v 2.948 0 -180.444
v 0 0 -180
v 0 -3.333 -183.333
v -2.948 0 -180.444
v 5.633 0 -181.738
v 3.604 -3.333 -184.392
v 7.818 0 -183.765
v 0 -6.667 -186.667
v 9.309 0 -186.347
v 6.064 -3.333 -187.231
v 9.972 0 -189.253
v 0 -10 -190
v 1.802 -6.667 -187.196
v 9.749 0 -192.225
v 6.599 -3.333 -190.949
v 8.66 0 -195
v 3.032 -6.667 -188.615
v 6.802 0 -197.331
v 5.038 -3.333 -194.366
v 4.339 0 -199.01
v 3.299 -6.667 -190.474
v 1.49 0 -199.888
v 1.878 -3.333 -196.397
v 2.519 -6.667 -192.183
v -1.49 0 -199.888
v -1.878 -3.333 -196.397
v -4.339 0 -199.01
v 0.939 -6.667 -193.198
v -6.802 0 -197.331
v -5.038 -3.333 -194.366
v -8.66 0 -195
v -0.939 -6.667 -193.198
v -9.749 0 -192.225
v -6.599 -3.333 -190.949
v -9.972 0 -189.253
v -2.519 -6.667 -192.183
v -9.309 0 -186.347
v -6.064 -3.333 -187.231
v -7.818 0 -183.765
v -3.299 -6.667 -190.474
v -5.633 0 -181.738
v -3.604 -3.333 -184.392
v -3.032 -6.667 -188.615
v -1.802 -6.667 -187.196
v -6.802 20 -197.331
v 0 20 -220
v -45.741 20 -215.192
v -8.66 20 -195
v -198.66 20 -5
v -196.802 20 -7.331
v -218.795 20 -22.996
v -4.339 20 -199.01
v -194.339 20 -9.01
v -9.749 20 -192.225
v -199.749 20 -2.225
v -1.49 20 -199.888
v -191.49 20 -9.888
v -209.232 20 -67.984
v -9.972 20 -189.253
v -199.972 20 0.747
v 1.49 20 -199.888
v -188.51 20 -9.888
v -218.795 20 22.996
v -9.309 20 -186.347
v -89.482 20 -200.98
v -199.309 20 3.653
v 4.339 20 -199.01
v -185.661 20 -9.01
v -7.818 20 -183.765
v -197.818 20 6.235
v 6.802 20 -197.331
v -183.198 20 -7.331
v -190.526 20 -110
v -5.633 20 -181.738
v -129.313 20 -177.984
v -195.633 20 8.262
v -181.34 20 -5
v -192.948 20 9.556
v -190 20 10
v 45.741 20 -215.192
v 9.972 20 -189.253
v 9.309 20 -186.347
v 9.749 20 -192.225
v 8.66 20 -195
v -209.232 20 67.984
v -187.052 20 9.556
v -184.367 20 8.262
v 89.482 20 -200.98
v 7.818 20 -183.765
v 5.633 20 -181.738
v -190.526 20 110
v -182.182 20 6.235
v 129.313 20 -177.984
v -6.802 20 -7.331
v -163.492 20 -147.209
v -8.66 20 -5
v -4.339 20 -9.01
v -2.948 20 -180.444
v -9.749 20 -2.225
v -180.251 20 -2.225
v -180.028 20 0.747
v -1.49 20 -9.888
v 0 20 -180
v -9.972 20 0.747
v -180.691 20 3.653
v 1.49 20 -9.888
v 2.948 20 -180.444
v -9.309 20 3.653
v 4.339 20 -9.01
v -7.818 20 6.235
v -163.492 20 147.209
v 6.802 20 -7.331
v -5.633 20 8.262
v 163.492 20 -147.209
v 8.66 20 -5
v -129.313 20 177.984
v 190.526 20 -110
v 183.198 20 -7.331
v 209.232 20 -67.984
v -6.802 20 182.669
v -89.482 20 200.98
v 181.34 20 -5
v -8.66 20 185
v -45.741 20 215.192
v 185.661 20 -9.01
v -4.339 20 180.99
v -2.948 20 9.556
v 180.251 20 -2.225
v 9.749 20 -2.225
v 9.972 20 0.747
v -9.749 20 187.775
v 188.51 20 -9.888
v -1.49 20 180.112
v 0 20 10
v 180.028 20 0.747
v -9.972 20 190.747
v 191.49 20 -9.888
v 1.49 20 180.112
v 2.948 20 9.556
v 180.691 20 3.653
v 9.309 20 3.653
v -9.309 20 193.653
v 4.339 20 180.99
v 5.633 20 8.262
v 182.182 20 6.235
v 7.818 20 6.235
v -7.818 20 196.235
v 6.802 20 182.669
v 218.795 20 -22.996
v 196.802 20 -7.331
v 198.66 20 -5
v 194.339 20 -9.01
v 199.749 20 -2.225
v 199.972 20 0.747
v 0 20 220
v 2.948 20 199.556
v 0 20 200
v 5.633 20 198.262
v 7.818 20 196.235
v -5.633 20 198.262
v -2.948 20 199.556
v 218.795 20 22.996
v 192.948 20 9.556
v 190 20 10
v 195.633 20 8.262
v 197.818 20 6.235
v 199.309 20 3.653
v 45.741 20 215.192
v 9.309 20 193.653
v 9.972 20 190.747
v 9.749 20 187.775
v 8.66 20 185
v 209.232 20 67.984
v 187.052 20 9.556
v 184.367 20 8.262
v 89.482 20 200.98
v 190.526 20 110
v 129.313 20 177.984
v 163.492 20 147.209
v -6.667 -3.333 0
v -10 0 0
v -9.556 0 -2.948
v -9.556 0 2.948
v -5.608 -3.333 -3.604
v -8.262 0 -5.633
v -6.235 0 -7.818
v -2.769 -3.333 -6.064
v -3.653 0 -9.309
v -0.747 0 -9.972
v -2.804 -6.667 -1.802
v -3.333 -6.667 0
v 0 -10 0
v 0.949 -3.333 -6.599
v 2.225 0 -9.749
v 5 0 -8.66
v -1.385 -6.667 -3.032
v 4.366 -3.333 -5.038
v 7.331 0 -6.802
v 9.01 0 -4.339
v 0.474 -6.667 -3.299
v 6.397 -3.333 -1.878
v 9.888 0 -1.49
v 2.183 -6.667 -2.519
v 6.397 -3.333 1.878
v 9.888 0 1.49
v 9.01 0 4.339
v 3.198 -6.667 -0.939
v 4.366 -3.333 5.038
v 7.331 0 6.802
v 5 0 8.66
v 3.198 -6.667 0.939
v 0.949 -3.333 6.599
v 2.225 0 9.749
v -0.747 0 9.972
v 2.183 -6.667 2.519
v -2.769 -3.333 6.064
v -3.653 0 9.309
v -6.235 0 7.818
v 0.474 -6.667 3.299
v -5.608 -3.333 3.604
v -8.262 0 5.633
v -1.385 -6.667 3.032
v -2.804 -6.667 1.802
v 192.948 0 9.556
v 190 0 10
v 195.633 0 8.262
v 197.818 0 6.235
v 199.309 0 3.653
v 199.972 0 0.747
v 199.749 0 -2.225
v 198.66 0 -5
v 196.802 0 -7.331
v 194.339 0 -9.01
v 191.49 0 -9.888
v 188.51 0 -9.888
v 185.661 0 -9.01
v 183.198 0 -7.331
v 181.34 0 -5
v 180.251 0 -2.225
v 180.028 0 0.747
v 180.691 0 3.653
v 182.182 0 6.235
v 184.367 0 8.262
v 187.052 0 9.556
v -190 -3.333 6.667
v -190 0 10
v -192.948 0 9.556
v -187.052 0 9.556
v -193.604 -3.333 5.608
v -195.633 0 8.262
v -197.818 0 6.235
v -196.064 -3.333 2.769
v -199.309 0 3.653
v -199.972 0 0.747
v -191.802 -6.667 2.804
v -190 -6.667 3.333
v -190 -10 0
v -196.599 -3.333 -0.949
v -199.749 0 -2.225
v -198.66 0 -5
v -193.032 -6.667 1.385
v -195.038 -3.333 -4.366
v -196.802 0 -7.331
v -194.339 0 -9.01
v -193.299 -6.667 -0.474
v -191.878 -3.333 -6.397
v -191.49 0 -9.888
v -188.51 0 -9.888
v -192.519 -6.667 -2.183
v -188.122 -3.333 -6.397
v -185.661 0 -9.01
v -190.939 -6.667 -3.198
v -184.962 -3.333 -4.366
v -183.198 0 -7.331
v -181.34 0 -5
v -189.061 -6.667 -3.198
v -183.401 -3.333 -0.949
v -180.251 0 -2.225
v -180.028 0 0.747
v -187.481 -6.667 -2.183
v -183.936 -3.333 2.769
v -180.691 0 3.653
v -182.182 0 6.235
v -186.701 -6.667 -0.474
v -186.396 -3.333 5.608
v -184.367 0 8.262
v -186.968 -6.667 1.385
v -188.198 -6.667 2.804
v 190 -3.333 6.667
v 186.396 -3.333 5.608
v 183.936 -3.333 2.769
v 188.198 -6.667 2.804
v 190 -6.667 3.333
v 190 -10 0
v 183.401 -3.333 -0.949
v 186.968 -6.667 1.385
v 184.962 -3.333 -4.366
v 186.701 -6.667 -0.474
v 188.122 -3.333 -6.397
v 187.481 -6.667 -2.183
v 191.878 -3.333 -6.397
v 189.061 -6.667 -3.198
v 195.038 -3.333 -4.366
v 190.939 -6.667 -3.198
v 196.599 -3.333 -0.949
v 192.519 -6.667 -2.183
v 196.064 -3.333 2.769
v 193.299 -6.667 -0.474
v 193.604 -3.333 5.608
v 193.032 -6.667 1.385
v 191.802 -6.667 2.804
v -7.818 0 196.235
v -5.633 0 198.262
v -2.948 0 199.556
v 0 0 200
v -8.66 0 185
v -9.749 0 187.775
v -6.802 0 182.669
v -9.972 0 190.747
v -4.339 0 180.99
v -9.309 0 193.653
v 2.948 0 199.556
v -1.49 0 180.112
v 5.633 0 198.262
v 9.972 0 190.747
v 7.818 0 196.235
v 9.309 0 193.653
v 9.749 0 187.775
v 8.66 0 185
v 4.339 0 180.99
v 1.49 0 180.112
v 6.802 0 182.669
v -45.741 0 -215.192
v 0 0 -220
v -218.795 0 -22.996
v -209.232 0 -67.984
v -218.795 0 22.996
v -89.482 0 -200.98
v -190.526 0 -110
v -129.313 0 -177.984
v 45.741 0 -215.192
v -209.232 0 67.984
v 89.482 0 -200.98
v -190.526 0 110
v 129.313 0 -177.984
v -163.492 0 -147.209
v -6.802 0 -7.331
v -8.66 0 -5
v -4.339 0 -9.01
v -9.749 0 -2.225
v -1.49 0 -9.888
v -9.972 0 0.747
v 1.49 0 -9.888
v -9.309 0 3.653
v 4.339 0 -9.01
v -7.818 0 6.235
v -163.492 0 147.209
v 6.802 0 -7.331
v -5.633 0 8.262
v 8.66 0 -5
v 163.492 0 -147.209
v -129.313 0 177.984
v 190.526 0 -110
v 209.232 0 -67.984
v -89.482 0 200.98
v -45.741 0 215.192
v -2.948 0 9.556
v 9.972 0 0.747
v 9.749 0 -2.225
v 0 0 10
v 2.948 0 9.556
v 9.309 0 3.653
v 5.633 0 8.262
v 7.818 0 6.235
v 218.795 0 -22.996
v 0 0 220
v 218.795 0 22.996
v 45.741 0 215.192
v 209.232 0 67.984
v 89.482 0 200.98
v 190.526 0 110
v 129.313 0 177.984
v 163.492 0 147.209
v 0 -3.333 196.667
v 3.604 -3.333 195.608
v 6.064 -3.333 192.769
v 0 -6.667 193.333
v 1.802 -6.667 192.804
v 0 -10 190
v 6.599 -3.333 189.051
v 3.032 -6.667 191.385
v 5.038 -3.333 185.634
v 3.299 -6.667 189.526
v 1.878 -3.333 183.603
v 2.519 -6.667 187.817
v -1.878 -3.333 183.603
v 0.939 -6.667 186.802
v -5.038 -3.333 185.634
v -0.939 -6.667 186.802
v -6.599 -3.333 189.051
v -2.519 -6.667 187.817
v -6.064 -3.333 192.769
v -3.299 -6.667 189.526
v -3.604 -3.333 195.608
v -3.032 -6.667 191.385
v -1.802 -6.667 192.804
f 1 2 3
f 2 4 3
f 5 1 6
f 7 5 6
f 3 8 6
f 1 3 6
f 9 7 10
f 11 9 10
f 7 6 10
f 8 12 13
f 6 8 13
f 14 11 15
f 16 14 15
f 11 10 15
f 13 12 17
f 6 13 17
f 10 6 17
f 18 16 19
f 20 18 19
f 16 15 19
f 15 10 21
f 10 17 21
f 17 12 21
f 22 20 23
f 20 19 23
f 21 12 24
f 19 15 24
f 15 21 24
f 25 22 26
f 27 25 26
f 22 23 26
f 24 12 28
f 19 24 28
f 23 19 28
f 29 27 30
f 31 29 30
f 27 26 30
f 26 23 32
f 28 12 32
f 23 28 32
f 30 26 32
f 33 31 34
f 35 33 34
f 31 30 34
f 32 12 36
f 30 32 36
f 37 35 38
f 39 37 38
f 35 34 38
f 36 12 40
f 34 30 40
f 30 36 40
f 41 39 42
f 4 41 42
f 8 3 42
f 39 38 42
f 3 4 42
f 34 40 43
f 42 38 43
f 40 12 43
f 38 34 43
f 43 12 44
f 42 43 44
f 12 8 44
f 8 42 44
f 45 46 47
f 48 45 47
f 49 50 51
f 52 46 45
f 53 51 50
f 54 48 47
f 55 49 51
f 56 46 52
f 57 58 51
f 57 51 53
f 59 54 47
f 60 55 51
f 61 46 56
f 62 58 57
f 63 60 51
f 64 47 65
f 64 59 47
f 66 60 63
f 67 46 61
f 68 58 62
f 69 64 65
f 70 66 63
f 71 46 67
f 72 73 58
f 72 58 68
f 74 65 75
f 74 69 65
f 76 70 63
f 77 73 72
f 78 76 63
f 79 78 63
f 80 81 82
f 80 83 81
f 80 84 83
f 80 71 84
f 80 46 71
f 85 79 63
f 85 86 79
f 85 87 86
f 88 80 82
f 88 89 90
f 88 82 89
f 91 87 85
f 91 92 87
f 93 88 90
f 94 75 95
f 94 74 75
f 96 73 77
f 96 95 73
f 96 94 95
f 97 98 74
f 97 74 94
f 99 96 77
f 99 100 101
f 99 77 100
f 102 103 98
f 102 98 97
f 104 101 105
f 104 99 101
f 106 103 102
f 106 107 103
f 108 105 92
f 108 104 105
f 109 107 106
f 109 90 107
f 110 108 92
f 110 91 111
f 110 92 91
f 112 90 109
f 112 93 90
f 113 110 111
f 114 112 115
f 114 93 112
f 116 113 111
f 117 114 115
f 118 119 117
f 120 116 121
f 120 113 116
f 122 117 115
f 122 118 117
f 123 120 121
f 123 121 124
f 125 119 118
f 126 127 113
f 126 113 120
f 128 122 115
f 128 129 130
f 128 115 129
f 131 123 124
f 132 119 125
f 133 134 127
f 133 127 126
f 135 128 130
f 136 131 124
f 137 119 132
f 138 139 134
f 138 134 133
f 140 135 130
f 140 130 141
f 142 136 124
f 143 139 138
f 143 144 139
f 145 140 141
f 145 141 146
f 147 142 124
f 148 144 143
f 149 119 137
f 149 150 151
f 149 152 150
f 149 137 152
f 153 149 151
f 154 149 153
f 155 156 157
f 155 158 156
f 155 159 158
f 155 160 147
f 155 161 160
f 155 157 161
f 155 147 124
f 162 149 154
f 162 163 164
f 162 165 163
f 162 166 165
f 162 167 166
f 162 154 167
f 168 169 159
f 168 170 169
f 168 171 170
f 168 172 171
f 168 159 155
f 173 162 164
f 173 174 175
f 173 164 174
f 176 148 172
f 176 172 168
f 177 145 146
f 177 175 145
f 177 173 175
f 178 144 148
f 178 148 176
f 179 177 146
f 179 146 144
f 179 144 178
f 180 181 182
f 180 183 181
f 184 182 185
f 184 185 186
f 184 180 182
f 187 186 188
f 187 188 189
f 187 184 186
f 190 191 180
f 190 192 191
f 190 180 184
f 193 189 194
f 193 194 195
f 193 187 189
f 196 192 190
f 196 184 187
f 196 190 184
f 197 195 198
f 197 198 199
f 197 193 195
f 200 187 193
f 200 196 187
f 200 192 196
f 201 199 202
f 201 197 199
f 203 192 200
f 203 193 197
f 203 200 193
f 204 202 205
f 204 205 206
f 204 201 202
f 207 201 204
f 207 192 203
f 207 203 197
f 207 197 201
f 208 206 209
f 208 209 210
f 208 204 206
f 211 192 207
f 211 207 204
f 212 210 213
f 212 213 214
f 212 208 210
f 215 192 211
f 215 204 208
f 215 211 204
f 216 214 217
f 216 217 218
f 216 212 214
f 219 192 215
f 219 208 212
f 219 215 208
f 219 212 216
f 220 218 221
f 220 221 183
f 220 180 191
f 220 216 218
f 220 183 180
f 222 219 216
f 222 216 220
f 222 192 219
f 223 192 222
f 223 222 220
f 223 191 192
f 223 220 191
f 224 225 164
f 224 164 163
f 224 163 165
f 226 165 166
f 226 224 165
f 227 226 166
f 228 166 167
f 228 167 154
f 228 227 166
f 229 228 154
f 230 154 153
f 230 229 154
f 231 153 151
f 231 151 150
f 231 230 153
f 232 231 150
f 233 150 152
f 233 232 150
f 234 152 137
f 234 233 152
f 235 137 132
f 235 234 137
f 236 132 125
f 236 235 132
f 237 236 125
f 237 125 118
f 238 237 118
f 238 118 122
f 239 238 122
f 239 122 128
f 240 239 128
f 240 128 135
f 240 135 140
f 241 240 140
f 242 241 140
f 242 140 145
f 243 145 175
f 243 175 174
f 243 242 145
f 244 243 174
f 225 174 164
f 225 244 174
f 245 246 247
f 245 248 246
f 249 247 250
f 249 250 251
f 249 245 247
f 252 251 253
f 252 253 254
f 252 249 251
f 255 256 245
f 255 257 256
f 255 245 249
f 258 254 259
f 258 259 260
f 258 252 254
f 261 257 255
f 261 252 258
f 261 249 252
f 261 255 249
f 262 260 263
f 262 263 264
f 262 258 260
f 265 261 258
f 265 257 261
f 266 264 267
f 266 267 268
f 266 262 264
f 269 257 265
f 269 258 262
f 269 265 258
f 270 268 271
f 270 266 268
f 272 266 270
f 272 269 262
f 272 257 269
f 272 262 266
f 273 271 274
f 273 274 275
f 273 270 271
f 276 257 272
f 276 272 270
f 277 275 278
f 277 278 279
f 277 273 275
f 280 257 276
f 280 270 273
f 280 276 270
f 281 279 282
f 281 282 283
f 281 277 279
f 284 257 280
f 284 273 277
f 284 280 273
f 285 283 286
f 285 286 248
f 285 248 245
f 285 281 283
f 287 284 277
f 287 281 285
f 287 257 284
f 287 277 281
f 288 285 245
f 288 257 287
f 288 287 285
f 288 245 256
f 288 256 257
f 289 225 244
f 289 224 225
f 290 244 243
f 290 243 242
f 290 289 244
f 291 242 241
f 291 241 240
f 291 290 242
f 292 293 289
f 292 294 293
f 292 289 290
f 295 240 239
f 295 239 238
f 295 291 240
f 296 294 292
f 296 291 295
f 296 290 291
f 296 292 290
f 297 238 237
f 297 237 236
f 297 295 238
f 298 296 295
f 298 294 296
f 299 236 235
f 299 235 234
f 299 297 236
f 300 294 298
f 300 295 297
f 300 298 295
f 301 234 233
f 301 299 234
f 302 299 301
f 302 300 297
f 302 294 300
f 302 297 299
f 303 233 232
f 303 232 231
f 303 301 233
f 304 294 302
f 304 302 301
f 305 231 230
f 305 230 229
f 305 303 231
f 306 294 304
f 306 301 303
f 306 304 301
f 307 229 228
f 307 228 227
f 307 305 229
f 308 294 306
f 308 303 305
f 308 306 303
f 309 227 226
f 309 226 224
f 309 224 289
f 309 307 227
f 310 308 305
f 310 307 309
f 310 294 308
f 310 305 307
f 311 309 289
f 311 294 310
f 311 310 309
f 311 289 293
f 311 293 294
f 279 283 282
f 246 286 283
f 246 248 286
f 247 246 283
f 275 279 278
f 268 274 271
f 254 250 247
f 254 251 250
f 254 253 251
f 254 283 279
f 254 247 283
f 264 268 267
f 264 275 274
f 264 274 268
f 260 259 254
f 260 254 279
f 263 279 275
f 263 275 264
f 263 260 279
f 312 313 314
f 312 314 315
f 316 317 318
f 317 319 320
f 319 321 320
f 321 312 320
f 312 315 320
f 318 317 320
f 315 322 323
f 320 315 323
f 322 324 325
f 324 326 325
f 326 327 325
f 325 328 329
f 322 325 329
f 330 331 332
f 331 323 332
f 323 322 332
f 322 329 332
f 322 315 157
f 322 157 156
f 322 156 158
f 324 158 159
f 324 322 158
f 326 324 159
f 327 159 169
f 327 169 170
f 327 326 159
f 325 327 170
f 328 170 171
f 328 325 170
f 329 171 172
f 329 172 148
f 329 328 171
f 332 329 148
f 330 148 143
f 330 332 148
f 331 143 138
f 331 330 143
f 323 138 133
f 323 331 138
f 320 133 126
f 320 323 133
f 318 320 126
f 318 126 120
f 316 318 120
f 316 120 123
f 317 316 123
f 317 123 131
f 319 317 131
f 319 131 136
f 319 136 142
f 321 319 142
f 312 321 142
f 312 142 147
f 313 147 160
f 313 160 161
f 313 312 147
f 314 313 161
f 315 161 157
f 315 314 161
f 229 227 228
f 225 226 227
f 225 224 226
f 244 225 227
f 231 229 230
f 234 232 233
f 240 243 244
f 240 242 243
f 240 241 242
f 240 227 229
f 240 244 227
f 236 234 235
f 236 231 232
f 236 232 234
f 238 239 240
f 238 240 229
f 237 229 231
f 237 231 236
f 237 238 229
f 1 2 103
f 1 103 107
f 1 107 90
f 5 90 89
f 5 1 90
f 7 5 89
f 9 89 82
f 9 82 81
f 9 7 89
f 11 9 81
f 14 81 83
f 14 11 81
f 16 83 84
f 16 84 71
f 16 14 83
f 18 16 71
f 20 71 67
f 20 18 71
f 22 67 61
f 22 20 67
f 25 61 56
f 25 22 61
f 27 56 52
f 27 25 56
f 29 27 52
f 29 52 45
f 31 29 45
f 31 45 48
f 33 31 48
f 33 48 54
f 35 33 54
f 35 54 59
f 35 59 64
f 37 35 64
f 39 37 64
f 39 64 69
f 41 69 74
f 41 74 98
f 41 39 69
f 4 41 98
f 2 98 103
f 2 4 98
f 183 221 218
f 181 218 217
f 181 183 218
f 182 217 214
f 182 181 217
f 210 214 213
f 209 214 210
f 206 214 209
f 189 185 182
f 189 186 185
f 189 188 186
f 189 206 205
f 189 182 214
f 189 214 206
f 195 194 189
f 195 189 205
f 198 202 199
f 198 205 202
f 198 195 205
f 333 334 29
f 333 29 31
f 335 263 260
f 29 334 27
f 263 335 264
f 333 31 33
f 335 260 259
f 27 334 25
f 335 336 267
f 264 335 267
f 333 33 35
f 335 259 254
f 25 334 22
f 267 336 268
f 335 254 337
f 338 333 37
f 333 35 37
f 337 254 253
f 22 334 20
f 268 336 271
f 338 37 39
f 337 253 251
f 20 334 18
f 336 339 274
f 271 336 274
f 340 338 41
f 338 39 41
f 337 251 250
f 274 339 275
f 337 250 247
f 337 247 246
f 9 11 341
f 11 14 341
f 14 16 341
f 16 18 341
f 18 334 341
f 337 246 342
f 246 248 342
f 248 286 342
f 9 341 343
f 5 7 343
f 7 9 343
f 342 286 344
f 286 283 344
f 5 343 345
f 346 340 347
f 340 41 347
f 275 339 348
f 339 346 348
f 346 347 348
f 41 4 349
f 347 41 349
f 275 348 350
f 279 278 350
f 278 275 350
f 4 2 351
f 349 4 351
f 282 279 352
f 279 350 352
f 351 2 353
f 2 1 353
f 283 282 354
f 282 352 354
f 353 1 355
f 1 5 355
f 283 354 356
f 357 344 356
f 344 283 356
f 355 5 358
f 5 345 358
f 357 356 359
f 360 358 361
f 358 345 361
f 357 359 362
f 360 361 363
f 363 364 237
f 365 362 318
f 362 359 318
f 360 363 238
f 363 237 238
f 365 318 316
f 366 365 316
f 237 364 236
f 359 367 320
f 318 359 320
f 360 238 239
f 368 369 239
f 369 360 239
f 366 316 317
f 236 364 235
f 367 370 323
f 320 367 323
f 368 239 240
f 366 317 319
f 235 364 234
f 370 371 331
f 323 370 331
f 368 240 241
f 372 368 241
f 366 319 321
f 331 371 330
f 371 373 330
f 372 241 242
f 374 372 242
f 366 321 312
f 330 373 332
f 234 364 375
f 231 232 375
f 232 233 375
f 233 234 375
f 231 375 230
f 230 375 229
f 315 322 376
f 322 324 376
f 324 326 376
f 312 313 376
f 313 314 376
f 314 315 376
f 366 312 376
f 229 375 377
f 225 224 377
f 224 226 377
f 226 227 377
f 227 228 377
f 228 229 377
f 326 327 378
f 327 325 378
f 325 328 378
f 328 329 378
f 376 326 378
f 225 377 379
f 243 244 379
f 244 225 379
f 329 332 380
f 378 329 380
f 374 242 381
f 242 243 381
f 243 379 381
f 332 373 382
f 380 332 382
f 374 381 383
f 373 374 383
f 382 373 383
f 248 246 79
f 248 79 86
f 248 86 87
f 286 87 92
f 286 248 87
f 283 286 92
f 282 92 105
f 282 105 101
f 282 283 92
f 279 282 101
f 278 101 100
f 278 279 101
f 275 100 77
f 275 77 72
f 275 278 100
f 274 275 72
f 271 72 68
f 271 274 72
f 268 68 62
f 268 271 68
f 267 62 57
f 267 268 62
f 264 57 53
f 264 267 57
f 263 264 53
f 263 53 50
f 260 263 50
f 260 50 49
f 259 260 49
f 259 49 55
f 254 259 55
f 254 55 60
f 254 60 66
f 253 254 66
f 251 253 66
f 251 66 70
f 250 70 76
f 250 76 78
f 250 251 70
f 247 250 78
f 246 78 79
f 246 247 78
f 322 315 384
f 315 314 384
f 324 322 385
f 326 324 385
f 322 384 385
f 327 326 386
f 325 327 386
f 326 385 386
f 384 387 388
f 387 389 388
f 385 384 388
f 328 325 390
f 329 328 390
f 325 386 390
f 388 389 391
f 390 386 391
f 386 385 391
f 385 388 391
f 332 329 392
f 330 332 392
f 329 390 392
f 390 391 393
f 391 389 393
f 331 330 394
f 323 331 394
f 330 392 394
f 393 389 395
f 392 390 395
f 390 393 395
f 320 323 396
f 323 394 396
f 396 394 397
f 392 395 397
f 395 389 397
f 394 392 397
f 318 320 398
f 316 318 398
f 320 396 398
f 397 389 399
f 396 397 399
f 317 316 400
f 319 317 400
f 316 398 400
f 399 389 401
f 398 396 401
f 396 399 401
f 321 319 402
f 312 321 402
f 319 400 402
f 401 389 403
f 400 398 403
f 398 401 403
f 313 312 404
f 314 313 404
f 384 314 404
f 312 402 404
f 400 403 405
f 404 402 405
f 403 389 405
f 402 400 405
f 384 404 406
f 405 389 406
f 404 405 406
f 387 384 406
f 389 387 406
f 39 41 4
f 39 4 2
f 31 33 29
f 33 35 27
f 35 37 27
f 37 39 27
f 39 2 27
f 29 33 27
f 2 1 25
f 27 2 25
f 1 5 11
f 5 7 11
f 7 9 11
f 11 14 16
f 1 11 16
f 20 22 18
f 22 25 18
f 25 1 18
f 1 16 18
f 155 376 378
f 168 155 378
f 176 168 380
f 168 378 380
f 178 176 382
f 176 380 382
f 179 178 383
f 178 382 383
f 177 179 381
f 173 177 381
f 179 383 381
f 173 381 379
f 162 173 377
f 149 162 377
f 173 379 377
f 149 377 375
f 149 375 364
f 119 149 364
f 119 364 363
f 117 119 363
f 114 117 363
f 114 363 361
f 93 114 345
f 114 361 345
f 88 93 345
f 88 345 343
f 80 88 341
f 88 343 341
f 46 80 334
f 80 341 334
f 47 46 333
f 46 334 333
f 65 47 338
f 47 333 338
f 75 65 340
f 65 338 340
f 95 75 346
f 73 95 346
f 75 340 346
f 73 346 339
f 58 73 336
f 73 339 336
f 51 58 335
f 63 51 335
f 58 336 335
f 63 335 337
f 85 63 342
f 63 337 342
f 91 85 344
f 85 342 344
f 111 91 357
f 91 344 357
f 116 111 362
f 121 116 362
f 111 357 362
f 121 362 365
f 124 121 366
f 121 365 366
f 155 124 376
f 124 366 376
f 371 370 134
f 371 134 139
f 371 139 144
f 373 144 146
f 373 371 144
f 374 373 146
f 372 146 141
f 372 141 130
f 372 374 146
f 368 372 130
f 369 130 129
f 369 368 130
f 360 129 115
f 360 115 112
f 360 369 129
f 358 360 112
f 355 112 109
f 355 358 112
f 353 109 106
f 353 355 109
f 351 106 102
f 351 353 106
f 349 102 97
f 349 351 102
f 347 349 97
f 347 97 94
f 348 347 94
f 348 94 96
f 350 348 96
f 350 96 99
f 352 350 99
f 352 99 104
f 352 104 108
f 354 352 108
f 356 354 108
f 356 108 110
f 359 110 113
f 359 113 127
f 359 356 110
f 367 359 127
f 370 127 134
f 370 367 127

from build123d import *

# Parameters (mm, degrees)
SKETCH1_R           = 220
SKETCH1_R_2         = 10
BOSS_EXTRUDE1_DEPTH = 20


with BuildPart() as part:
    # Sketch1 → Boss-Extrude1 (new body)
    with BuildSketch(Plane(origin=(0, 0, 0), x_dir=(1, 0, 0), z_dir=(0, 1, 0))):
        Circle(SKETCH1_R)
        with Locations((0, 190)):
            Circle(SKETCH1_R_2, mode=Mode.SUBTRACT)
        with Locations((190, 0)):
            Circle(SKETCH1_R_2, mode=Mode.SUBTRACT)
        with Locations((0, -190)):
            Circle(SKETCH1_R_2, mode=Mode.SUBTRACT)
        with Locations((-190, 0)):
            Circle(SKETCH1_R_2, mode=Mode.SUBTRACT)
        Circle(SKETCH1_R_2, mode=Mode.SUBTRACT)
    extrude(amount=BOSS_EXTRUDE1_DEPTH)


with BuildPart() as body_2:
    # Sketch2 → Revolve2 (revolve)
    with BuildSketch(Plane.XY):
        Polygon((10, 0), (0, 0), (0, -10), align=None)
    revolve(axis=Axis((0, 0, 0), (0, -1, 0)))


with BuildPart() as body_3:
    # Sketch2<3> → Revolve3 (revolve)
    with BuildSketch(Plane.XY):
        Polygon((-190, -10), (-180, 0), (-190, 0), align=None)
    revolve(axis=Axis((-190, 0, 0), (0, -1, 0)))


with BuildPart() as body_4:
    # Sketch4 → Revolve4 (revolve)
    with BuildSketch(Plane(origin=(0, 0, 0), x_dir=(0, 0, -1), z_dir=(1, 0, 0))):
        Polygon((-190, -10), (-180, 0), (-190, 0), align=None)
    revolve(axis=Axis((0, -10, 190), (0, 1, 0)))


with BuildPart() as body_5:
    # Sketch2<4> → Revolve5 (revolve)
    with BuildSketch(Plane.XY):
        Polygon((190, -10), (190, 0), (180, 0), align=None)
    revolve(axis=Axis((190, 0, 0), (0, -1, 0)))


with BuildPart() as body_6:
    # Sketch4<3> → Revolve7 (revolve)
    with BuildSketch(Plane(origin=(0, 0, 0), x_dir=(0, 0, -1), z_dir=(1, 0, 0))):
        Polygon((180, 0), (190, -10), (190, 0), align=None)
    revolve(axis=Axis((0, -10, -190), (0, 1, 0)))


solid = Compound([part.part, body_2.part, body_3.part, body_4.part, body_5.part, body_6.part])
